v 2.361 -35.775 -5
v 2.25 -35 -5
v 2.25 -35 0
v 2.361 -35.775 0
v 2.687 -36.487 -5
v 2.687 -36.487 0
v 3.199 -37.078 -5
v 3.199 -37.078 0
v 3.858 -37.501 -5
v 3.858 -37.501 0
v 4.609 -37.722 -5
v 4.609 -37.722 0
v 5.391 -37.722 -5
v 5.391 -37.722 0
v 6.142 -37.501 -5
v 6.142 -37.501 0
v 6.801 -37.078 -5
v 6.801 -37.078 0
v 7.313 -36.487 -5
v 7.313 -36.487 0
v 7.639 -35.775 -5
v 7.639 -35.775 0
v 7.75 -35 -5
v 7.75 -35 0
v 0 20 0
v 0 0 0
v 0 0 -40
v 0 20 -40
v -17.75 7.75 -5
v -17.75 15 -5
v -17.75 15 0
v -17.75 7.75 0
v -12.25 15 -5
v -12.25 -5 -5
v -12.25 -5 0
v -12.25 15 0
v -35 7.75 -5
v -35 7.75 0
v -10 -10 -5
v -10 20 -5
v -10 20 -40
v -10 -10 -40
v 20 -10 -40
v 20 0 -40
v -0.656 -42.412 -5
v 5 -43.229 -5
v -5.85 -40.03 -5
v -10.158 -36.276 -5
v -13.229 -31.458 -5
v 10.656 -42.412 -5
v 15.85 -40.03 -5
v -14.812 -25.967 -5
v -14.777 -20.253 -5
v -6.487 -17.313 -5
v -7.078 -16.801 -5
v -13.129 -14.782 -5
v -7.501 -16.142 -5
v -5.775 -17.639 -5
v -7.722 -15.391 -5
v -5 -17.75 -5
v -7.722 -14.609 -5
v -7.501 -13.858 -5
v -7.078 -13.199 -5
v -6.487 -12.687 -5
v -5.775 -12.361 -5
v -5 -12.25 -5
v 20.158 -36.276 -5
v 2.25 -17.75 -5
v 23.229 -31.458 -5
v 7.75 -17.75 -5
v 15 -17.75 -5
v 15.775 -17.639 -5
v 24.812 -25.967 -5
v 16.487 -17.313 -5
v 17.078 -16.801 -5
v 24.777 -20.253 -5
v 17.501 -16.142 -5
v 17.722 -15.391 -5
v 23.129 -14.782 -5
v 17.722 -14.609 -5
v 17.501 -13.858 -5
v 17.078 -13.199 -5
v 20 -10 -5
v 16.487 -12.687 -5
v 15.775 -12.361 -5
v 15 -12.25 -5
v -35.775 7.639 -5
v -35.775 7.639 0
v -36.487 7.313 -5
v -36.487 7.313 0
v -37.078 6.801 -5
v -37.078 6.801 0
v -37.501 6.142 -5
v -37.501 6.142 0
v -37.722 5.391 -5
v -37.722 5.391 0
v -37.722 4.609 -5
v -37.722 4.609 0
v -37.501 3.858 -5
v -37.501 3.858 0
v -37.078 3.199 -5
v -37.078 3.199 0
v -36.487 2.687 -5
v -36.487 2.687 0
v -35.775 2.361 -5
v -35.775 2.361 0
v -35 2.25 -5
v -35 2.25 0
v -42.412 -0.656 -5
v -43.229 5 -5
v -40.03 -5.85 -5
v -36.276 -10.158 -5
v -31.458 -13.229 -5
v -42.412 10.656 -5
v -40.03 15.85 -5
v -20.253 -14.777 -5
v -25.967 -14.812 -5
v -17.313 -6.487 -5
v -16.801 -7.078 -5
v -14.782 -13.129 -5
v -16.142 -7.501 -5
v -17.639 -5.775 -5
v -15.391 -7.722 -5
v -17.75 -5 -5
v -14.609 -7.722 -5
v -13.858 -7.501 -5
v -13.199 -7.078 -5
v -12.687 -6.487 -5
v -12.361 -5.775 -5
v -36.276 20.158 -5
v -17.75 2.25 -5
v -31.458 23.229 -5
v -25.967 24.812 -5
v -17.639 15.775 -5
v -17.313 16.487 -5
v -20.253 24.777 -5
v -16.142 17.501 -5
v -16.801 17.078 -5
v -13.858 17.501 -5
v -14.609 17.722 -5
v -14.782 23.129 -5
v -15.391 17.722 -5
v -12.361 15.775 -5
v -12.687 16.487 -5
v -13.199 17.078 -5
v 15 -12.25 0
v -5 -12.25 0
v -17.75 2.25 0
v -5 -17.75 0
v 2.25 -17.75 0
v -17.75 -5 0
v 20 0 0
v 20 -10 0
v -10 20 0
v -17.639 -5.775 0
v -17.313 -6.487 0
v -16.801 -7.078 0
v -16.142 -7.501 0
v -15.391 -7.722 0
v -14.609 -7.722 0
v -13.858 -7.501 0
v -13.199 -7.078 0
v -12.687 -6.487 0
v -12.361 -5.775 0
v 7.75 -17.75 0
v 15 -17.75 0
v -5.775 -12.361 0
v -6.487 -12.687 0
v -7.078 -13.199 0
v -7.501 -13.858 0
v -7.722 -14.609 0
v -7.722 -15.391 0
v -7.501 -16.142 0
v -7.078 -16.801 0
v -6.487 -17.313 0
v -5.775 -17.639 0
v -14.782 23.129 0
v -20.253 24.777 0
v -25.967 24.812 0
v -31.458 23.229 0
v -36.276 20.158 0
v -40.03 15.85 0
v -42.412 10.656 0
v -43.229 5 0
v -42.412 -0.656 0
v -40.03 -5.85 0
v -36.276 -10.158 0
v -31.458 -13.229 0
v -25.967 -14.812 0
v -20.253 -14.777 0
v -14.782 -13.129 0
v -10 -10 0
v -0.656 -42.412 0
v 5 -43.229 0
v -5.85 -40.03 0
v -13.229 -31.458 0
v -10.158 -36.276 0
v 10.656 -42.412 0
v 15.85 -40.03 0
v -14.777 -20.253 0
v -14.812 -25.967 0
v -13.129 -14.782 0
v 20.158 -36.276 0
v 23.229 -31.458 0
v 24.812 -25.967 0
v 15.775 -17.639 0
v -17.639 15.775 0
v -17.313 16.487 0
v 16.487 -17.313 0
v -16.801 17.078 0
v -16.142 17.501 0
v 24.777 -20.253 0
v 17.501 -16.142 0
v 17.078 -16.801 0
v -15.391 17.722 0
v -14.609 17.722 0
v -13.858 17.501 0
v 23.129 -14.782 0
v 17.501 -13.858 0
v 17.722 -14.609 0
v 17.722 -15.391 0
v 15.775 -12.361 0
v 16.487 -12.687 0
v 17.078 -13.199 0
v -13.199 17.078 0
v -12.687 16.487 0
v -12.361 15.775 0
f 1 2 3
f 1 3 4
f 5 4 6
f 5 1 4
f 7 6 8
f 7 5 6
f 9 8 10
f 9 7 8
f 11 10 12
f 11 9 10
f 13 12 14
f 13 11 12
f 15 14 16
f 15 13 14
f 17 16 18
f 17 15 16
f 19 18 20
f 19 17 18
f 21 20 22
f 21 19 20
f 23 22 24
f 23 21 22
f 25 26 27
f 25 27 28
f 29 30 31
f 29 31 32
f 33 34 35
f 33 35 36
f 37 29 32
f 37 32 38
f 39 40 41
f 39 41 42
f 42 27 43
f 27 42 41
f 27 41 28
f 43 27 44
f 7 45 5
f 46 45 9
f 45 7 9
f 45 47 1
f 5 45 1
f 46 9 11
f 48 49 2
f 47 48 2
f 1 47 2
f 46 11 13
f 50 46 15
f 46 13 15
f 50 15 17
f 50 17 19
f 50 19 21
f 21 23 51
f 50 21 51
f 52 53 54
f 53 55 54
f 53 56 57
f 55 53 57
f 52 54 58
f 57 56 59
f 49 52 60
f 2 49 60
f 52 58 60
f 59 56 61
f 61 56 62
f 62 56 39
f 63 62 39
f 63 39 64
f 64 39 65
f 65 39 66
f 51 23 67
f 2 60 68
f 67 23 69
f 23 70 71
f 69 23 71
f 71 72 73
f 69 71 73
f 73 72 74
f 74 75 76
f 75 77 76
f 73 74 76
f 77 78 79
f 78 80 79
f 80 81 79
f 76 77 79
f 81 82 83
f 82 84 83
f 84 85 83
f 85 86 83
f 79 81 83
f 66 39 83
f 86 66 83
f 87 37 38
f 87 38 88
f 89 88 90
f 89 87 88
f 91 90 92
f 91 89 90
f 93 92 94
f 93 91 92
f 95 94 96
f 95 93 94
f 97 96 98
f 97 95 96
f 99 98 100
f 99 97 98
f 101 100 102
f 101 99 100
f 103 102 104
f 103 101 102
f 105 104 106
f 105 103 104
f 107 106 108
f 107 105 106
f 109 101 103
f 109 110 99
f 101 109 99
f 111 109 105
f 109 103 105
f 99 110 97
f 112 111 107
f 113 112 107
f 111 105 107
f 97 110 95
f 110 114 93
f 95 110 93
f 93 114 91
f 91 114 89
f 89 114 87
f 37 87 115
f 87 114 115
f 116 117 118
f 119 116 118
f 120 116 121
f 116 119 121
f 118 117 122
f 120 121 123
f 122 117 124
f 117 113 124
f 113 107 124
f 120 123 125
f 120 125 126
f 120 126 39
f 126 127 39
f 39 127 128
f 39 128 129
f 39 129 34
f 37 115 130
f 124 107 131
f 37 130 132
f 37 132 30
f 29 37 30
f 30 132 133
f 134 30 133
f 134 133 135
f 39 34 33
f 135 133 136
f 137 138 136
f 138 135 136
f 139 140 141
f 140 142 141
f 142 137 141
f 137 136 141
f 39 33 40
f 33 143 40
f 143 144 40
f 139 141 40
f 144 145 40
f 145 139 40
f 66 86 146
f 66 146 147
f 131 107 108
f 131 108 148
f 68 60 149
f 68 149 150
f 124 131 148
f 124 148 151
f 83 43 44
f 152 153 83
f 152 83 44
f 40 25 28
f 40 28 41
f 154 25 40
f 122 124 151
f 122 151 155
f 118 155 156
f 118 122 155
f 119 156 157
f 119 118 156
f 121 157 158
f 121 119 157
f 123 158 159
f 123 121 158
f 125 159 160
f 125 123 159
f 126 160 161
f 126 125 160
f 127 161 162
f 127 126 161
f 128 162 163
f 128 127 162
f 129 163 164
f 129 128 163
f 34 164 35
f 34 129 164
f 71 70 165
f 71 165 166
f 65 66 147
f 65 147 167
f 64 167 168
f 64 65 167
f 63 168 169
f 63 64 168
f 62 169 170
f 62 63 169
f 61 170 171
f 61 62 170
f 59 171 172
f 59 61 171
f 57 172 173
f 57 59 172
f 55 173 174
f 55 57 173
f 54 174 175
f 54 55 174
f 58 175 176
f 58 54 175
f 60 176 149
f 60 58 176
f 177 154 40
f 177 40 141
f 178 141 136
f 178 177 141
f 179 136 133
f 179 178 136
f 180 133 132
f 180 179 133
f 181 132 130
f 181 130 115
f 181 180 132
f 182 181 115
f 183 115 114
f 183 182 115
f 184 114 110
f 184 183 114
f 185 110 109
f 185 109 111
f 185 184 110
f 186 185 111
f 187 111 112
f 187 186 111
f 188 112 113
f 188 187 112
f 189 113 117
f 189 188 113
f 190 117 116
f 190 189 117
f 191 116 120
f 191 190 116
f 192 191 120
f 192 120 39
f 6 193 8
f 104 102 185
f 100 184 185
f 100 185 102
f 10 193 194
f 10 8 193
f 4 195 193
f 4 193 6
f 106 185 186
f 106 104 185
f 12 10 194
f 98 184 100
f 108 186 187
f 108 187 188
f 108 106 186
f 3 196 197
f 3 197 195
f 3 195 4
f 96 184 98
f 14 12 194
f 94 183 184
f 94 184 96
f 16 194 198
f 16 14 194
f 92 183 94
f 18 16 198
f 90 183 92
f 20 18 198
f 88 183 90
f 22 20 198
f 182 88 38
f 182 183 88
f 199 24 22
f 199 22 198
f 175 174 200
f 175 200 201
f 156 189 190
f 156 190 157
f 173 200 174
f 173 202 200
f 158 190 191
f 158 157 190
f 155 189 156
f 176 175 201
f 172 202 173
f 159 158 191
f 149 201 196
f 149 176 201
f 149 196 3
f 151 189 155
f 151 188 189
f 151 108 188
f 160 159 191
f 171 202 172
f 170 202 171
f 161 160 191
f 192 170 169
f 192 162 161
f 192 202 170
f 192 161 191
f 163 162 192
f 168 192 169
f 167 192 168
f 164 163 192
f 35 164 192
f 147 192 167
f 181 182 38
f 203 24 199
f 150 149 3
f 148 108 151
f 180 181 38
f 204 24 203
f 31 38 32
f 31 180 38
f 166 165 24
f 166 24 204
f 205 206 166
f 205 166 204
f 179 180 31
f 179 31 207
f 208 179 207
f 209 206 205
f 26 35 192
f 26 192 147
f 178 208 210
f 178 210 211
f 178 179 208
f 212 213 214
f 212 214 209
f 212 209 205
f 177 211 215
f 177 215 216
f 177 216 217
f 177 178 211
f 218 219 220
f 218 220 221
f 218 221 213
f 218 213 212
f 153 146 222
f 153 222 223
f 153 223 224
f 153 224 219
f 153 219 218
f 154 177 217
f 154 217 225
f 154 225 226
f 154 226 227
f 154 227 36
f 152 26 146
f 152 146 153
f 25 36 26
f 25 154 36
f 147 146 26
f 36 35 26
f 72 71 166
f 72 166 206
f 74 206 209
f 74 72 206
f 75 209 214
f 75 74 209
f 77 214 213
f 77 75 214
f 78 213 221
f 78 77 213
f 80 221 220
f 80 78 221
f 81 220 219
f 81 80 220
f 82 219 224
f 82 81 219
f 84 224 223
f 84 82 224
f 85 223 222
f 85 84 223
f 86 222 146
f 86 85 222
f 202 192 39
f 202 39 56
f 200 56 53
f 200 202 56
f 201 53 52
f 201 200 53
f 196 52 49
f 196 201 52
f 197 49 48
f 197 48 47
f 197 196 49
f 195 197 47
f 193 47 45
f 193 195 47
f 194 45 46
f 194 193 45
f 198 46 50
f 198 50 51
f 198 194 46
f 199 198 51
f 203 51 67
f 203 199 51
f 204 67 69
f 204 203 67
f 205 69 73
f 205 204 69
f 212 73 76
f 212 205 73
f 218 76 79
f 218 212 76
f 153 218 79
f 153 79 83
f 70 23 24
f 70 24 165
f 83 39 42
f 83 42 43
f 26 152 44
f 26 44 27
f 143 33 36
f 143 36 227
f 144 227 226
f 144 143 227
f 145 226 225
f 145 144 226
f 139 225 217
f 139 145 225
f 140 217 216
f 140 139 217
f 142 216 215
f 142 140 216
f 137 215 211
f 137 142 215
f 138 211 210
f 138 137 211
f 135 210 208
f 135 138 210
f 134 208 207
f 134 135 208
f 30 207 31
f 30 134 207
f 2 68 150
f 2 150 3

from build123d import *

# Parameters (mm, degrees)
WALLS_DEPTH = 40
TABS_DEPTH  = 5
HOLES_DEPTH = 71.444664714


with BuildPart() as part:
    # Sketch1 → Walls (new body)
    with BuildSketch(Plane.XY):
        Polygon((0, 20), (-10, 20), (-10, -10), (20, -10), (20, 0), (0, 0), align=None)
    extrude(amount=-WALLS_DEPTH)

    # Sketch2 → Tabs (add)
    with BuildSketch(Plane.XY):
        with BuildLine():
            Line((20, -10), (-10, -10))
            ThreePointArc((-10, -10), (5, -43.228756555), (20, -10))
        make_face()
        with BuildLine():
            Line((-10, -10), (-10, 20))
            ThreePointArc((-10, 20), (-43.228756555, 5), (-10, -10))
        make_face()
    extrude(amount=-TABS_DEPTH)

    # Sketch3 → Holes (cut, through all)
    with BuildSketch(Plane(origin=(0, 0, -5), x_dir=(-1, 0, 0), z_dir=(0, 0, -1))):
        with BuildLine():
            Line((12.25, -5), (12.25, 15))
            ThreePointArc((12.25, 15), (15, 17.75), (17.75, 15))
            Line((17.75, 15), (17.75, 7.75))
            Line((17.75, 7.75), (35, 7.75))
            ThreePointArc((35, 7.75), (37.75, 5), (35, 2.25))
            Line((35, 2.25), (17.75, 2.25))
            Line((17.75, 2.25), (17.75, -5))
            ThreePointArc((17.75, -5), (15, -7.75), (12.25, -5))
        make_face()
        with BuildLine():
            Line((5, -17.75), (-2.25, -17.75))
            Line((-2.25, -17.75), (-2.25, -35))
            ThreePointArc((-2.25, -35), (-5, -37.75), (-7.75, -35))
            Line((-7.75, -35), (-7.75, -17.75))
            Line((-7.75, -17.75), (-15, -17.75))
            ThreePointArc((-15, -17.75), (-17.75, -15), (-15, -12.25))
            Line((-15, -12.25), (5, -12.25))
            ThreePointArc((5, -12.25), (7.75, -15), (5, -17.75))
        make_face()
    extrude(amount=-HOLES_DEPTH, mode=Mode.SUBTRACT)


solid = part.part
